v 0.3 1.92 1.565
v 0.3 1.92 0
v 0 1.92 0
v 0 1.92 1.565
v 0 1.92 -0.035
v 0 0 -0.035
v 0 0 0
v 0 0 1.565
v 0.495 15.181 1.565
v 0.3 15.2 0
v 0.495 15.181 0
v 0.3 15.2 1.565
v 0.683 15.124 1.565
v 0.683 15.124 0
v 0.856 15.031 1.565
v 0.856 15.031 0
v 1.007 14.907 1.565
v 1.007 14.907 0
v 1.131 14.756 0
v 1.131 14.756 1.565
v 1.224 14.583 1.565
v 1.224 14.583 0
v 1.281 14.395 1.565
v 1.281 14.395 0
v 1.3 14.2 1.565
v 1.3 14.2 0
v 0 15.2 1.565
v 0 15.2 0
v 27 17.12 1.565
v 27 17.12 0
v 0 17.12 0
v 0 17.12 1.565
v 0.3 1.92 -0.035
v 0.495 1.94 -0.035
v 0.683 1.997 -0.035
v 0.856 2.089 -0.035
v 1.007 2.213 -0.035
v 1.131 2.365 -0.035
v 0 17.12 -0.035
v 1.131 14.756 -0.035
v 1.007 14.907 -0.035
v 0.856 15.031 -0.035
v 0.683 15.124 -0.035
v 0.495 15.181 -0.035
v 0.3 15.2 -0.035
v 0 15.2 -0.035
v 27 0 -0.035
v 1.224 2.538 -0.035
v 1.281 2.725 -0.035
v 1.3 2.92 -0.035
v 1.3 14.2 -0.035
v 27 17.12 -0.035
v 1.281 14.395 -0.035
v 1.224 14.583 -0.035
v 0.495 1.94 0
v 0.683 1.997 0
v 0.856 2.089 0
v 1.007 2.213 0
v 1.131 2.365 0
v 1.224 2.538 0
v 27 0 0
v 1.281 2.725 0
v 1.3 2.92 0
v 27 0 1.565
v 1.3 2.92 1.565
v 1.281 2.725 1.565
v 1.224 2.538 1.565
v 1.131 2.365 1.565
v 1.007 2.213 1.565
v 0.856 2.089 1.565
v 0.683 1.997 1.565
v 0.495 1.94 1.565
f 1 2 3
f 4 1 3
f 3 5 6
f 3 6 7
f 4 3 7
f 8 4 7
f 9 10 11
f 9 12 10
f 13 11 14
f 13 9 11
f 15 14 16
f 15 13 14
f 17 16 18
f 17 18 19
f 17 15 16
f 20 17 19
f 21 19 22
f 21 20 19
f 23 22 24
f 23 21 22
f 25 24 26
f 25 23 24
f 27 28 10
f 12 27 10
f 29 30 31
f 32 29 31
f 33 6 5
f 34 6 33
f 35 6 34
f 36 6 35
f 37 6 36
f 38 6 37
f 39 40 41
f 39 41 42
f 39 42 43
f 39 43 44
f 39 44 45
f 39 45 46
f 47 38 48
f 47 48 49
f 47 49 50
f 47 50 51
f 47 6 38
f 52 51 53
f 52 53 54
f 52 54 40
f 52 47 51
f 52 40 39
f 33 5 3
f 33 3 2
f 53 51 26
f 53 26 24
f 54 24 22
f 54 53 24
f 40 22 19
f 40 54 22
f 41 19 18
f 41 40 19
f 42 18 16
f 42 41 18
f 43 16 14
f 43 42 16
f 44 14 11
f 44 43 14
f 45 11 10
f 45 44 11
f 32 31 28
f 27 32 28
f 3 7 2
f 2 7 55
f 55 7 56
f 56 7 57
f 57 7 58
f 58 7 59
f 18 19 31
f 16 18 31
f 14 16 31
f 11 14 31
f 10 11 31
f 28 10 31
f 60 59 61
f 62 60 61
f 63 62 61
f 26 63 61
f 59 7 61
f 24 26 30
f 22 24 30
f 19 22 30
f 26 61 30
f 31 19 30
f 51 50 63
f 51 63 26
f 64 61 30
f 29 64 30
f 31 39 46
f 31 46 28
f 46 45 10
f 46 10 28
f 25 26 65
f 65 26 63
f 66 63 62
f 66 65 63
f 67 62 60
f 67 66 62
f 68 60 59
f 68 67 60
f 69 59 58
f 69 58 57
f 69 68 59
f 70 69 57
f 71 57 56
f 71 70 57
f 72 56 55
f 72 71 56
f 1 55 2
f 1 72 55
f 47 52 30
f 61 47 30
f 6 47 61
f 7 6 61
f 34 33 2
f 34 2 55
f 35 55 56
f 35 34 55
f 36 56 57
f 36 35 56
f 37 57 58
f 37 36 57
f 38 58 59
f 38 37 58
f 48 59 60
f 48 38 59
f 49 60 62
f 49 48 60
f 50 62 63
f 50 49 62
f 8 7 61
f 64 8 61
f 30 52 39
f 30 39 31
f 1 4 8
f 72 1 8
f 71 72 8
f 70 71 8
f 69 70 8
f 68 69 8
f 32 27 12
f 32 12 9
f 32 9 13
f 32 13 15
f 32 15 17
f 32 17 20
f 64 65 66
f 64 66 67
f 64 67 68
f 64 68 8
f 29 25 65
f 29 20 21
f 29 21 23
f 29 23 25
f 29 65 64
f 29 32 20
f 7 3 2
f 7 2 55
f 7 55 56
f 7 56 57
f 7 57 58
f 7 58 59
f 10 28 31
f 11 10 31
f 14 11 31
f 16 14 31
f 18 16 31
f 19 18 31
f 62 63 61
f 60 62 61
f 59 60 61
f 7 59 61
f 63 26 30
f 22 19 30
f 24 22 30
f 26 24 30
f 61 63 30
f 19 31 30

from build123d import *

# Parameters (mm, degrees)
BOSS_EXTRUDE1_DEPTH = 1.565
FILLET2_R           = 1
FILLET3_R           = 1
SKETCH4_W           = 0.035
SKETCH4_H           = 17.120447321
BOSS_EXTRUDE2_DEPTH = 27
CUT_EXTRUDE2_DEPTH  = 27


with BuildPart() as part:
    # Sketch1 → Boss-Extrude1 (new body)
    with BuildSketch(Plane.XY):
        Polygon((0, 0), (27, 0), (27, 17.120447321), (0, 17.120447321), (0, 15.2), (1.3, 15.2), (1.3, 1.920447321), (0, 1.920447321), align=None)
    extrude(amount=BOSS_EXTRUDE1_DEPTH)

    # Fillet2
    fillet2_edges = [part.edges().sort_by_distance(p)[0] for p in [
        (1.3, 15.2, 0.7825),
    ]]
    fillet(fillet2_edges, radius=FILLET2_R)

    # Fillet3
    fillet3_edges = [part.edges().sort_by_distance(p)[0] for p in [
        (1.3, 1.920447321, 0.7825),
    ]]
    fillet(fillet3_edges, radius=FILLET3_R)


with BuildPart() as body_2:
    # Sketch4 → Boss-Extrude2 (new body)
    with BuildSketch(Plane(origin=(27, 0, 0), x_dir=(0, 0, -1), z_dir=(1, 0, 0))):
        with Locations((0.0525, 8.560223661)):
            Rectangle(SKETCH4_W, SKETCH4_H)
    extrude(amount=-BOSS_EXTRUDE2_DEPTH)

    # Sketch5 → Cut-Extrude2 (cut)
    with BuildSketch(Plane.XY.offset(-0.035)):
        with BuildLine():
            Line((1.3, 2.920447321), (1.3, 14.2))
            ThreePointArc((1.3, 14.2), (1.007106781, 14.907106781), (0.3, 15.2))
            Line((0.3, 15.2), (0, 15.2))
            Line((0, 15.2), (0, 1.920447321))
            Line((0, 1.920447321), (0.3, 1.920447321))
            ThreePointArc((0.3, 1.920447321), (1.007106781, 2.213340539), (1.3, 2.920447321))
        make_face()
    extrude(amount=-CUT_EXTRUDE2_DEPTH, mode=Mode.SUBTRACT)


with BuildPart() as body_3:
    # Mirror1: mirrored copy
    add(body_2.part.mirror(Plane(origin=(0, 17.120447321, -0.035), x_dir=(1, 0, 0), z_dir=(0, 0, 1))))


solid = Compound([part.part, body_3.part])
